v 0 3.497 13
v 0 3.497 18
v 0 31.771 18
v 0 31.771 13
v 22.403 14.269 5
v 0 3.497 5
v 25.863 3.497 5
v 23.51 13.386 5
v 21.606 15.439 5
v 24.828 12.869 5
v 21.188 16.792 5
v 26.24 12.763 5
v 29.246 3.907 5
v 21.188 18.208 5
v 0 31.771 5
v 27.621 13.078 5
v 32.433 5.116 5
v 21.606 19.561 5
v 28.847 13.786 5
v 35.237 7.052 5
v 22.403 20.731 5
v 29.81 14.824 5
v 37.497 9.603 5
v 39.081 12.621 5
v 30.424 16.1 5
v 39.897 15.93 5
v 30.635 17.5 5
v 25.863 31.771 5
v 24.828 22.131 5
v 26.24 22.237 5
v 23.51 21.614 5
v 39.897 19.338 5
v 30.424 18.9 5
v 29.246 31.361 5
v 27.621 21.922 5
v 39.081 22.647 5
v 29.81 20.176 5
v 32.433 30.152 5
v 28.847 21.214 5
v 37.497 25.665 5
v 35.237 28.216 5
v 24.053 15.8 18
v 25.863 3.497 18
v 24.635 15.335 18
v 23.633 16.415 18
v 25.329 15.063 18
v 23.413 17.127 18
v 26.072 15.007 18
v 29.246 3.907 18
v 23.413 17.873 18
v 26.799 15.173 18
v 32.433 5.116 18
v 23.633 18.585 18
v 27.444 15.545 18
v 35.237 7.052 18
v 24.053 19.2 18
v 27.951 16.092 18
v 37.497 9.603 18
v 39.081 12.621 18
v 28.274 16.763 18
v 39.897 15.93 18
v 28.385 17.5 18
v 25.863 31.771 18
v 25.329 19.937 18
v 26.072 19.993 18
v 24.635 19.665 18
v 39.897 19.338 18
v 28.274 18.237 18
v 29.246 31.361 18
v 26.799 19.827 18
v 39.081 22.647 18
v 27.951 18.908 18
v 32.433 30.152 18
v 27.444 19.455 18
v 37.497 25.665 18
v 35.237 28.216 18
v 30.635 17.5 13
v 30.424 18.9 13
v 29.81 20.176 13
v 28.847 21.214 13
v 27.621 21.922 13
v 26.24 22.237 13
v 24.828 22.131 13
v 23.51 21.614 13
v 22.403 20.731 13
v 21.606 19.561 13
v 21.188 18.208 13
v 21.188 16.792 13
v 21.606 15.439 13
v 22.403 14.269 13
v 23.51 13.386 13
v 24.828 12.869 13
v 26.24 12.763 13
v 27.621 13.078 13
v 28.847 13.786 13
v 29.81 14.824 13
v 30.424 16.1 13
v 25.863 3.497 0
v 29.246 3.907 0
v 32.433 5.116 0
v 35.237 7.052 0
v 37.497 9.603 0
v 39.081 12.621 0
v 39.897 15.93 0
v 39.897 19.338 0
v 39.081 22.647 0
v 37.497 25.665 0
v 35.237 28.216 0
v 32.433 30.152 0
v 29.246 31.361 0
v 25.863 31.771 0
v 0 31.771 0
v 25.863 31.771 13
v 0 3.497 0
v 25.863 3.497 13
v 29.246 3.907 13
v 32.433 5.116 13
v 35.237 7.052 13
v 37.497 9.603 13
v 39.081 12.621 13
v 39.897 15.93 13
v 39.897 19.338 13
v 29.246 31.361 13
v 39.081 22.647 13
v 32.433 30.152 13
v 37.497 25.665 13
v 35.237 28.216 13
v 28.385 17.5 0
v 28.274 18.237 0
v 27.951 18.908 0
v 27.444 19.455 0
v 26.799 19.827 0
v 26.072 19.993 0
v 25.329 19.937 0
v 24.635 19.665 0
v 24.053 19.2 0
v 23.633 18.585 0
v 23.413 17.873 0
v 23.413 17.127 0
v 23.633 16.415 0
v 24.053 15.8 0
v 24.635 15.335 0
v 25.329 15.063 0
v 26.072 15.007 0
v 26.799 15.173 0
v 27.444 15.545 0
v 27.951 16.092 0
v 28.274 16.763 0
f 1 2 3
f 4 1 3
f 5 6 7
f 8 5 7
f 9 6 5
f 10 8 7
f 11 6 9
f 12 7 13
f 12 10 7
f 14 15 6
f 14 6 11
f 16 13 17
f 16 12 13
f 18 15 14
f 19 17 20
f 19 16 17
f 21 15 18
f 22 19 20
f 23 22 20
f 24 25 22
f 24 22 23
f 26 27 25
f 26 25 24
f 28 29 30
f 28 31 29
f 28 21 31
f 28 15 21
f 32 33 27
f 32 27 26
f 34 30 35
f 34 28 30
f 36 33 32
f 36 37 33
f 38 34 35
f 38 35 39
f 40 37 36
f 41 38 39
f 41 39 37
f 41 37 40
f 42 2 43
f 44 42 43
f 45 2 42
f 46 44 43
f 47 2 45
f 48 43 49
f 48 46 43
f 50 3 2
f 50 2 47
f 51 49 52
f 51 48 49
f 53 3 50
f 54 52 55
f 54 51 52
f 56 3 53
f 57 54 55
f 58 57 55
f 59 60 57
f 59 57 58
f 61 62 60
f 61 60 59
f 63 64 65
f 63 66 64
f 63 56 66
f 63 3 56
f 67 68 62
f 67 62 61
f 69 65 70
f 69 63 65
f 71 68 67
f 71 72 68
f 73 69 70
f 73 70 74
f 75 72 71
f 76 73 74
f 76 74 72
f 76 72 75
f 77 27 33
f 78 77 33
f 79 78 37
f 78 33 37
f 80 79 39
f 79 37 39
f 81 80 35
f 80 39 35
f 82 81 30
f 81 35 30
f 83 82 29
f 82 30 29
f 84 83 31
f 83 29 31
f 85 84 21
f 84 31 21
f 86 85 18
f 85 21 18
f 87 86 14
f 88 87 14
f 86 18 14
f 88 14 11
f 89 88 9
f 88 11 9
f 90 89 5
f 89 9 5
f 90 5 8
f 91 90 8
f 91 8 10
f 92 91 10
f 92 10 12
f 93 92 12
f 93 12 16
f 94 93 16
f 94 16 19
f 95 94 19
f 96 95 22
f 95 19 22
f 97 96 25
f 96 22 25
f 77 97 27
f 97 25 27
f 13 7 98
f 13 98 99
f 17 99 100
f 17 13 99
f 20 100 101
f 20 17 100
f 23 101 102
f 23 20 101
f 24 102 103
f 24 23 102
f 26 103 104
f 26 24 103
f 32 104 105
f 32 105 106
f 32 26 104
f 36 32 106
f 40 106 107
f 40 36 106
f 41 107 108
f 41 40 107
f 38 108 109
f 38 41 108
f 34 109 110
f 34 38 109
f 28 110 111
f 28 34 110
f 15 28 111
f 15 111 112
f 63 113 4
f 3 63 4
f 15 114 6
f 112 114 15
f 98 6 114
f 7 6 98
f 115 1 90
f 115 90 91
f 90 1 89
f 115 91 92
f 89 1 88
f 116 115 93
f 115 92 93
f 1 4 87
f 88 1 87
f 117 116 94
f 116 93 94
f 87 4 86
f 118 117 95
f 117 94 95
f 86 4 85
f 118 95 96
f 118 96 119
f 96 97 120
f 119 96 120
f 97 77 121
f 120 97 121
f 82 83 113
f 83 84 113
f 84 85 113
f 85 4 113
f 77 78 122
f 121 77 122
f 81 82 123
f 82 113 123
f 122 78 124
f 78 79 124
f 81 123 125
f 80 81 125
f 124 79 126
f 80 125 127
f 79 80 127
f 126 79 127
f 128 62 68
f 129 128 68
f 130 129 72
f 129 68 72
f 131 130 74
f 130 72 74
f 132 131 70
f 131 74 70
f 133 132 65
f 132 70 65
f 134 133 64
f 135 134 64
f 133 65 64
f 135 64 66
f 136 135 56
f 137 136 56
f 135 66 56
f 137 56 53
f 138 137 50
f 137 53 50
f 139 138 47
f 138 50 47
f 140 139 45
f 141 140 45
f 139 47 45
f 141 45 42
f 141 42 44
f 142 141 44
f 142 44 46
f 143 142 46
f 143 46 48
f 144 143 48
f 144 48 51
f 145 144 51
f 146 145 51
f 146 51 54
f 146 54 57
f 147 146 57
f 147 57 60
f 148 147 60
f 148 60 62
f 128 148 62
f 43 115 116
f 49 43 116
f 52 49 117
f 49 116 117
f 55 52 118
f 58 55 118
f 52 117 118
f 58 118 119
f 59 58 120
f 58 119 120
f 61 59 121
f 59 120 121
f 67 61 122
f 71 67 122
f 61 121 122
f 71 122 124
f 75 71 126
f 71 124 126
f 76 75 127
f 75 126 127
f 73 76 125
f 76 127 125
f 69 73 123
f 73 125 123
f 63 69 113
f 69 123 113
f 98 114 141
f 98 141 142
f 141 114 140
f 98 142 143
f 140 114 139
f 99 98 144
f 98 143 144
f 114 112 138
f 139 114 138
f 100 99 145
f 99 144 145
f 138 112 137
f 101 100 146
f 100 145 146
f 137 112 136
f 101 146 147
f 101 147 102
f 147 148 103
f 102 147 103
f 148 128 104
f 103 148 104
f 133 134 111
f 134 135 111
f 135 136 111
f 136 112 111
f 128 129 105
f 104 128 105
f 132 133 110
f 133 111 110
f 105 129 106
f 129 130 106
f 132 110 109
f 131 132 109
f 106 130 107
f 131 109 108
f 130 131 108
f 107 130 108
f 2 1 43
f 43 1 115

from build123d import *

# Parameters (mm, degrees)
SKETCH2_W               = 40
SKETCH2_H               = 35
BOSS_EXTRUDE1_DEPTH     = 5
SKETCH4_R               = 4.75
BOSS_EXTRUDE2_DEPTH     = 8
SKETCH6_OUTSIDE_W       = 53.224
SKETCH6_OUTSIDE_H       = 48.224
CUT_EXTRUDE2_DEPTH      = 20
CUT_EXTRUDE2_DEPTH_BACK = 20
M6X1_0_TAPPED_HOLE1_D   = 5


with BuildPart() as part:
    # Sketch2 → Boss-Extrude1 (new body)
    with BuildSketch(Plane.XY):
        with Locations((20, 17.5)):
            Rectangle(SKETCH2_W, SKETCH2_H)
    extrude(amount=BOSS_EXTRUDE1_DEPTH)

    # Sketch4 → Boss-Extrude2 (add)
    with BuildSketch(Plane.XY.offset(5)):
        with Locations((25.885379028, 17.5)):
            Circle(SKETCH4_R)
    extrude(amount=BOSS_EXTRUDE2_DEPTH)

    # Mirror4: part across plane


with BuildPart() as part_1:
    add(part.part)
    add(part.part.mirror(Plane.XY.offset(9)))

    # Sketch6 outside → Cut-Extrude2 (cut, two sides)
    with BuildSketch(Plane.XY.offset(5)) as cut_extrude2_sk:
        with Locations((20, 17.5)):
            Rectangle(SKETCH6_OUTSIDE_W, SKETCH6_OUTSIDE_H)
        with BuildLine():
            Line((25.86267887, 31.77132519), (0, 31.77132519))
            Line((0, 31.77132519), (0, 3.496682929))
            Line((0, 3.496682929), (25.86267887, 3.496682929))
            ThreePointArc((25.86267887, 3.496682929), (40, 17.63400406), (25.86267887, 31.77132519))
        make_face(mode=Mode.SUBTRACT)
    extrude(amount=CUT_EXTRUDE2_DEPTH, mode=Mode.SUBTRACT)
    extrude(cut_extrude2_sk.sketch, amount=-CUT_EXTRUDE2_DEPTH_BACK, mode=Mode.SUBTRACT)

    # M6x1.0 Tapped Hole1 (through all)
    with Locations(Plane(origin=(0, 0, 0), x_dir=(-1, 0, 0), z_dir=(0, 0, -1))):
        with Locations((-25.885379028, 17.5)):
            Hole(M6X1_0_TAPPED_HOLE1_D / 2)


solid = part_1.part
